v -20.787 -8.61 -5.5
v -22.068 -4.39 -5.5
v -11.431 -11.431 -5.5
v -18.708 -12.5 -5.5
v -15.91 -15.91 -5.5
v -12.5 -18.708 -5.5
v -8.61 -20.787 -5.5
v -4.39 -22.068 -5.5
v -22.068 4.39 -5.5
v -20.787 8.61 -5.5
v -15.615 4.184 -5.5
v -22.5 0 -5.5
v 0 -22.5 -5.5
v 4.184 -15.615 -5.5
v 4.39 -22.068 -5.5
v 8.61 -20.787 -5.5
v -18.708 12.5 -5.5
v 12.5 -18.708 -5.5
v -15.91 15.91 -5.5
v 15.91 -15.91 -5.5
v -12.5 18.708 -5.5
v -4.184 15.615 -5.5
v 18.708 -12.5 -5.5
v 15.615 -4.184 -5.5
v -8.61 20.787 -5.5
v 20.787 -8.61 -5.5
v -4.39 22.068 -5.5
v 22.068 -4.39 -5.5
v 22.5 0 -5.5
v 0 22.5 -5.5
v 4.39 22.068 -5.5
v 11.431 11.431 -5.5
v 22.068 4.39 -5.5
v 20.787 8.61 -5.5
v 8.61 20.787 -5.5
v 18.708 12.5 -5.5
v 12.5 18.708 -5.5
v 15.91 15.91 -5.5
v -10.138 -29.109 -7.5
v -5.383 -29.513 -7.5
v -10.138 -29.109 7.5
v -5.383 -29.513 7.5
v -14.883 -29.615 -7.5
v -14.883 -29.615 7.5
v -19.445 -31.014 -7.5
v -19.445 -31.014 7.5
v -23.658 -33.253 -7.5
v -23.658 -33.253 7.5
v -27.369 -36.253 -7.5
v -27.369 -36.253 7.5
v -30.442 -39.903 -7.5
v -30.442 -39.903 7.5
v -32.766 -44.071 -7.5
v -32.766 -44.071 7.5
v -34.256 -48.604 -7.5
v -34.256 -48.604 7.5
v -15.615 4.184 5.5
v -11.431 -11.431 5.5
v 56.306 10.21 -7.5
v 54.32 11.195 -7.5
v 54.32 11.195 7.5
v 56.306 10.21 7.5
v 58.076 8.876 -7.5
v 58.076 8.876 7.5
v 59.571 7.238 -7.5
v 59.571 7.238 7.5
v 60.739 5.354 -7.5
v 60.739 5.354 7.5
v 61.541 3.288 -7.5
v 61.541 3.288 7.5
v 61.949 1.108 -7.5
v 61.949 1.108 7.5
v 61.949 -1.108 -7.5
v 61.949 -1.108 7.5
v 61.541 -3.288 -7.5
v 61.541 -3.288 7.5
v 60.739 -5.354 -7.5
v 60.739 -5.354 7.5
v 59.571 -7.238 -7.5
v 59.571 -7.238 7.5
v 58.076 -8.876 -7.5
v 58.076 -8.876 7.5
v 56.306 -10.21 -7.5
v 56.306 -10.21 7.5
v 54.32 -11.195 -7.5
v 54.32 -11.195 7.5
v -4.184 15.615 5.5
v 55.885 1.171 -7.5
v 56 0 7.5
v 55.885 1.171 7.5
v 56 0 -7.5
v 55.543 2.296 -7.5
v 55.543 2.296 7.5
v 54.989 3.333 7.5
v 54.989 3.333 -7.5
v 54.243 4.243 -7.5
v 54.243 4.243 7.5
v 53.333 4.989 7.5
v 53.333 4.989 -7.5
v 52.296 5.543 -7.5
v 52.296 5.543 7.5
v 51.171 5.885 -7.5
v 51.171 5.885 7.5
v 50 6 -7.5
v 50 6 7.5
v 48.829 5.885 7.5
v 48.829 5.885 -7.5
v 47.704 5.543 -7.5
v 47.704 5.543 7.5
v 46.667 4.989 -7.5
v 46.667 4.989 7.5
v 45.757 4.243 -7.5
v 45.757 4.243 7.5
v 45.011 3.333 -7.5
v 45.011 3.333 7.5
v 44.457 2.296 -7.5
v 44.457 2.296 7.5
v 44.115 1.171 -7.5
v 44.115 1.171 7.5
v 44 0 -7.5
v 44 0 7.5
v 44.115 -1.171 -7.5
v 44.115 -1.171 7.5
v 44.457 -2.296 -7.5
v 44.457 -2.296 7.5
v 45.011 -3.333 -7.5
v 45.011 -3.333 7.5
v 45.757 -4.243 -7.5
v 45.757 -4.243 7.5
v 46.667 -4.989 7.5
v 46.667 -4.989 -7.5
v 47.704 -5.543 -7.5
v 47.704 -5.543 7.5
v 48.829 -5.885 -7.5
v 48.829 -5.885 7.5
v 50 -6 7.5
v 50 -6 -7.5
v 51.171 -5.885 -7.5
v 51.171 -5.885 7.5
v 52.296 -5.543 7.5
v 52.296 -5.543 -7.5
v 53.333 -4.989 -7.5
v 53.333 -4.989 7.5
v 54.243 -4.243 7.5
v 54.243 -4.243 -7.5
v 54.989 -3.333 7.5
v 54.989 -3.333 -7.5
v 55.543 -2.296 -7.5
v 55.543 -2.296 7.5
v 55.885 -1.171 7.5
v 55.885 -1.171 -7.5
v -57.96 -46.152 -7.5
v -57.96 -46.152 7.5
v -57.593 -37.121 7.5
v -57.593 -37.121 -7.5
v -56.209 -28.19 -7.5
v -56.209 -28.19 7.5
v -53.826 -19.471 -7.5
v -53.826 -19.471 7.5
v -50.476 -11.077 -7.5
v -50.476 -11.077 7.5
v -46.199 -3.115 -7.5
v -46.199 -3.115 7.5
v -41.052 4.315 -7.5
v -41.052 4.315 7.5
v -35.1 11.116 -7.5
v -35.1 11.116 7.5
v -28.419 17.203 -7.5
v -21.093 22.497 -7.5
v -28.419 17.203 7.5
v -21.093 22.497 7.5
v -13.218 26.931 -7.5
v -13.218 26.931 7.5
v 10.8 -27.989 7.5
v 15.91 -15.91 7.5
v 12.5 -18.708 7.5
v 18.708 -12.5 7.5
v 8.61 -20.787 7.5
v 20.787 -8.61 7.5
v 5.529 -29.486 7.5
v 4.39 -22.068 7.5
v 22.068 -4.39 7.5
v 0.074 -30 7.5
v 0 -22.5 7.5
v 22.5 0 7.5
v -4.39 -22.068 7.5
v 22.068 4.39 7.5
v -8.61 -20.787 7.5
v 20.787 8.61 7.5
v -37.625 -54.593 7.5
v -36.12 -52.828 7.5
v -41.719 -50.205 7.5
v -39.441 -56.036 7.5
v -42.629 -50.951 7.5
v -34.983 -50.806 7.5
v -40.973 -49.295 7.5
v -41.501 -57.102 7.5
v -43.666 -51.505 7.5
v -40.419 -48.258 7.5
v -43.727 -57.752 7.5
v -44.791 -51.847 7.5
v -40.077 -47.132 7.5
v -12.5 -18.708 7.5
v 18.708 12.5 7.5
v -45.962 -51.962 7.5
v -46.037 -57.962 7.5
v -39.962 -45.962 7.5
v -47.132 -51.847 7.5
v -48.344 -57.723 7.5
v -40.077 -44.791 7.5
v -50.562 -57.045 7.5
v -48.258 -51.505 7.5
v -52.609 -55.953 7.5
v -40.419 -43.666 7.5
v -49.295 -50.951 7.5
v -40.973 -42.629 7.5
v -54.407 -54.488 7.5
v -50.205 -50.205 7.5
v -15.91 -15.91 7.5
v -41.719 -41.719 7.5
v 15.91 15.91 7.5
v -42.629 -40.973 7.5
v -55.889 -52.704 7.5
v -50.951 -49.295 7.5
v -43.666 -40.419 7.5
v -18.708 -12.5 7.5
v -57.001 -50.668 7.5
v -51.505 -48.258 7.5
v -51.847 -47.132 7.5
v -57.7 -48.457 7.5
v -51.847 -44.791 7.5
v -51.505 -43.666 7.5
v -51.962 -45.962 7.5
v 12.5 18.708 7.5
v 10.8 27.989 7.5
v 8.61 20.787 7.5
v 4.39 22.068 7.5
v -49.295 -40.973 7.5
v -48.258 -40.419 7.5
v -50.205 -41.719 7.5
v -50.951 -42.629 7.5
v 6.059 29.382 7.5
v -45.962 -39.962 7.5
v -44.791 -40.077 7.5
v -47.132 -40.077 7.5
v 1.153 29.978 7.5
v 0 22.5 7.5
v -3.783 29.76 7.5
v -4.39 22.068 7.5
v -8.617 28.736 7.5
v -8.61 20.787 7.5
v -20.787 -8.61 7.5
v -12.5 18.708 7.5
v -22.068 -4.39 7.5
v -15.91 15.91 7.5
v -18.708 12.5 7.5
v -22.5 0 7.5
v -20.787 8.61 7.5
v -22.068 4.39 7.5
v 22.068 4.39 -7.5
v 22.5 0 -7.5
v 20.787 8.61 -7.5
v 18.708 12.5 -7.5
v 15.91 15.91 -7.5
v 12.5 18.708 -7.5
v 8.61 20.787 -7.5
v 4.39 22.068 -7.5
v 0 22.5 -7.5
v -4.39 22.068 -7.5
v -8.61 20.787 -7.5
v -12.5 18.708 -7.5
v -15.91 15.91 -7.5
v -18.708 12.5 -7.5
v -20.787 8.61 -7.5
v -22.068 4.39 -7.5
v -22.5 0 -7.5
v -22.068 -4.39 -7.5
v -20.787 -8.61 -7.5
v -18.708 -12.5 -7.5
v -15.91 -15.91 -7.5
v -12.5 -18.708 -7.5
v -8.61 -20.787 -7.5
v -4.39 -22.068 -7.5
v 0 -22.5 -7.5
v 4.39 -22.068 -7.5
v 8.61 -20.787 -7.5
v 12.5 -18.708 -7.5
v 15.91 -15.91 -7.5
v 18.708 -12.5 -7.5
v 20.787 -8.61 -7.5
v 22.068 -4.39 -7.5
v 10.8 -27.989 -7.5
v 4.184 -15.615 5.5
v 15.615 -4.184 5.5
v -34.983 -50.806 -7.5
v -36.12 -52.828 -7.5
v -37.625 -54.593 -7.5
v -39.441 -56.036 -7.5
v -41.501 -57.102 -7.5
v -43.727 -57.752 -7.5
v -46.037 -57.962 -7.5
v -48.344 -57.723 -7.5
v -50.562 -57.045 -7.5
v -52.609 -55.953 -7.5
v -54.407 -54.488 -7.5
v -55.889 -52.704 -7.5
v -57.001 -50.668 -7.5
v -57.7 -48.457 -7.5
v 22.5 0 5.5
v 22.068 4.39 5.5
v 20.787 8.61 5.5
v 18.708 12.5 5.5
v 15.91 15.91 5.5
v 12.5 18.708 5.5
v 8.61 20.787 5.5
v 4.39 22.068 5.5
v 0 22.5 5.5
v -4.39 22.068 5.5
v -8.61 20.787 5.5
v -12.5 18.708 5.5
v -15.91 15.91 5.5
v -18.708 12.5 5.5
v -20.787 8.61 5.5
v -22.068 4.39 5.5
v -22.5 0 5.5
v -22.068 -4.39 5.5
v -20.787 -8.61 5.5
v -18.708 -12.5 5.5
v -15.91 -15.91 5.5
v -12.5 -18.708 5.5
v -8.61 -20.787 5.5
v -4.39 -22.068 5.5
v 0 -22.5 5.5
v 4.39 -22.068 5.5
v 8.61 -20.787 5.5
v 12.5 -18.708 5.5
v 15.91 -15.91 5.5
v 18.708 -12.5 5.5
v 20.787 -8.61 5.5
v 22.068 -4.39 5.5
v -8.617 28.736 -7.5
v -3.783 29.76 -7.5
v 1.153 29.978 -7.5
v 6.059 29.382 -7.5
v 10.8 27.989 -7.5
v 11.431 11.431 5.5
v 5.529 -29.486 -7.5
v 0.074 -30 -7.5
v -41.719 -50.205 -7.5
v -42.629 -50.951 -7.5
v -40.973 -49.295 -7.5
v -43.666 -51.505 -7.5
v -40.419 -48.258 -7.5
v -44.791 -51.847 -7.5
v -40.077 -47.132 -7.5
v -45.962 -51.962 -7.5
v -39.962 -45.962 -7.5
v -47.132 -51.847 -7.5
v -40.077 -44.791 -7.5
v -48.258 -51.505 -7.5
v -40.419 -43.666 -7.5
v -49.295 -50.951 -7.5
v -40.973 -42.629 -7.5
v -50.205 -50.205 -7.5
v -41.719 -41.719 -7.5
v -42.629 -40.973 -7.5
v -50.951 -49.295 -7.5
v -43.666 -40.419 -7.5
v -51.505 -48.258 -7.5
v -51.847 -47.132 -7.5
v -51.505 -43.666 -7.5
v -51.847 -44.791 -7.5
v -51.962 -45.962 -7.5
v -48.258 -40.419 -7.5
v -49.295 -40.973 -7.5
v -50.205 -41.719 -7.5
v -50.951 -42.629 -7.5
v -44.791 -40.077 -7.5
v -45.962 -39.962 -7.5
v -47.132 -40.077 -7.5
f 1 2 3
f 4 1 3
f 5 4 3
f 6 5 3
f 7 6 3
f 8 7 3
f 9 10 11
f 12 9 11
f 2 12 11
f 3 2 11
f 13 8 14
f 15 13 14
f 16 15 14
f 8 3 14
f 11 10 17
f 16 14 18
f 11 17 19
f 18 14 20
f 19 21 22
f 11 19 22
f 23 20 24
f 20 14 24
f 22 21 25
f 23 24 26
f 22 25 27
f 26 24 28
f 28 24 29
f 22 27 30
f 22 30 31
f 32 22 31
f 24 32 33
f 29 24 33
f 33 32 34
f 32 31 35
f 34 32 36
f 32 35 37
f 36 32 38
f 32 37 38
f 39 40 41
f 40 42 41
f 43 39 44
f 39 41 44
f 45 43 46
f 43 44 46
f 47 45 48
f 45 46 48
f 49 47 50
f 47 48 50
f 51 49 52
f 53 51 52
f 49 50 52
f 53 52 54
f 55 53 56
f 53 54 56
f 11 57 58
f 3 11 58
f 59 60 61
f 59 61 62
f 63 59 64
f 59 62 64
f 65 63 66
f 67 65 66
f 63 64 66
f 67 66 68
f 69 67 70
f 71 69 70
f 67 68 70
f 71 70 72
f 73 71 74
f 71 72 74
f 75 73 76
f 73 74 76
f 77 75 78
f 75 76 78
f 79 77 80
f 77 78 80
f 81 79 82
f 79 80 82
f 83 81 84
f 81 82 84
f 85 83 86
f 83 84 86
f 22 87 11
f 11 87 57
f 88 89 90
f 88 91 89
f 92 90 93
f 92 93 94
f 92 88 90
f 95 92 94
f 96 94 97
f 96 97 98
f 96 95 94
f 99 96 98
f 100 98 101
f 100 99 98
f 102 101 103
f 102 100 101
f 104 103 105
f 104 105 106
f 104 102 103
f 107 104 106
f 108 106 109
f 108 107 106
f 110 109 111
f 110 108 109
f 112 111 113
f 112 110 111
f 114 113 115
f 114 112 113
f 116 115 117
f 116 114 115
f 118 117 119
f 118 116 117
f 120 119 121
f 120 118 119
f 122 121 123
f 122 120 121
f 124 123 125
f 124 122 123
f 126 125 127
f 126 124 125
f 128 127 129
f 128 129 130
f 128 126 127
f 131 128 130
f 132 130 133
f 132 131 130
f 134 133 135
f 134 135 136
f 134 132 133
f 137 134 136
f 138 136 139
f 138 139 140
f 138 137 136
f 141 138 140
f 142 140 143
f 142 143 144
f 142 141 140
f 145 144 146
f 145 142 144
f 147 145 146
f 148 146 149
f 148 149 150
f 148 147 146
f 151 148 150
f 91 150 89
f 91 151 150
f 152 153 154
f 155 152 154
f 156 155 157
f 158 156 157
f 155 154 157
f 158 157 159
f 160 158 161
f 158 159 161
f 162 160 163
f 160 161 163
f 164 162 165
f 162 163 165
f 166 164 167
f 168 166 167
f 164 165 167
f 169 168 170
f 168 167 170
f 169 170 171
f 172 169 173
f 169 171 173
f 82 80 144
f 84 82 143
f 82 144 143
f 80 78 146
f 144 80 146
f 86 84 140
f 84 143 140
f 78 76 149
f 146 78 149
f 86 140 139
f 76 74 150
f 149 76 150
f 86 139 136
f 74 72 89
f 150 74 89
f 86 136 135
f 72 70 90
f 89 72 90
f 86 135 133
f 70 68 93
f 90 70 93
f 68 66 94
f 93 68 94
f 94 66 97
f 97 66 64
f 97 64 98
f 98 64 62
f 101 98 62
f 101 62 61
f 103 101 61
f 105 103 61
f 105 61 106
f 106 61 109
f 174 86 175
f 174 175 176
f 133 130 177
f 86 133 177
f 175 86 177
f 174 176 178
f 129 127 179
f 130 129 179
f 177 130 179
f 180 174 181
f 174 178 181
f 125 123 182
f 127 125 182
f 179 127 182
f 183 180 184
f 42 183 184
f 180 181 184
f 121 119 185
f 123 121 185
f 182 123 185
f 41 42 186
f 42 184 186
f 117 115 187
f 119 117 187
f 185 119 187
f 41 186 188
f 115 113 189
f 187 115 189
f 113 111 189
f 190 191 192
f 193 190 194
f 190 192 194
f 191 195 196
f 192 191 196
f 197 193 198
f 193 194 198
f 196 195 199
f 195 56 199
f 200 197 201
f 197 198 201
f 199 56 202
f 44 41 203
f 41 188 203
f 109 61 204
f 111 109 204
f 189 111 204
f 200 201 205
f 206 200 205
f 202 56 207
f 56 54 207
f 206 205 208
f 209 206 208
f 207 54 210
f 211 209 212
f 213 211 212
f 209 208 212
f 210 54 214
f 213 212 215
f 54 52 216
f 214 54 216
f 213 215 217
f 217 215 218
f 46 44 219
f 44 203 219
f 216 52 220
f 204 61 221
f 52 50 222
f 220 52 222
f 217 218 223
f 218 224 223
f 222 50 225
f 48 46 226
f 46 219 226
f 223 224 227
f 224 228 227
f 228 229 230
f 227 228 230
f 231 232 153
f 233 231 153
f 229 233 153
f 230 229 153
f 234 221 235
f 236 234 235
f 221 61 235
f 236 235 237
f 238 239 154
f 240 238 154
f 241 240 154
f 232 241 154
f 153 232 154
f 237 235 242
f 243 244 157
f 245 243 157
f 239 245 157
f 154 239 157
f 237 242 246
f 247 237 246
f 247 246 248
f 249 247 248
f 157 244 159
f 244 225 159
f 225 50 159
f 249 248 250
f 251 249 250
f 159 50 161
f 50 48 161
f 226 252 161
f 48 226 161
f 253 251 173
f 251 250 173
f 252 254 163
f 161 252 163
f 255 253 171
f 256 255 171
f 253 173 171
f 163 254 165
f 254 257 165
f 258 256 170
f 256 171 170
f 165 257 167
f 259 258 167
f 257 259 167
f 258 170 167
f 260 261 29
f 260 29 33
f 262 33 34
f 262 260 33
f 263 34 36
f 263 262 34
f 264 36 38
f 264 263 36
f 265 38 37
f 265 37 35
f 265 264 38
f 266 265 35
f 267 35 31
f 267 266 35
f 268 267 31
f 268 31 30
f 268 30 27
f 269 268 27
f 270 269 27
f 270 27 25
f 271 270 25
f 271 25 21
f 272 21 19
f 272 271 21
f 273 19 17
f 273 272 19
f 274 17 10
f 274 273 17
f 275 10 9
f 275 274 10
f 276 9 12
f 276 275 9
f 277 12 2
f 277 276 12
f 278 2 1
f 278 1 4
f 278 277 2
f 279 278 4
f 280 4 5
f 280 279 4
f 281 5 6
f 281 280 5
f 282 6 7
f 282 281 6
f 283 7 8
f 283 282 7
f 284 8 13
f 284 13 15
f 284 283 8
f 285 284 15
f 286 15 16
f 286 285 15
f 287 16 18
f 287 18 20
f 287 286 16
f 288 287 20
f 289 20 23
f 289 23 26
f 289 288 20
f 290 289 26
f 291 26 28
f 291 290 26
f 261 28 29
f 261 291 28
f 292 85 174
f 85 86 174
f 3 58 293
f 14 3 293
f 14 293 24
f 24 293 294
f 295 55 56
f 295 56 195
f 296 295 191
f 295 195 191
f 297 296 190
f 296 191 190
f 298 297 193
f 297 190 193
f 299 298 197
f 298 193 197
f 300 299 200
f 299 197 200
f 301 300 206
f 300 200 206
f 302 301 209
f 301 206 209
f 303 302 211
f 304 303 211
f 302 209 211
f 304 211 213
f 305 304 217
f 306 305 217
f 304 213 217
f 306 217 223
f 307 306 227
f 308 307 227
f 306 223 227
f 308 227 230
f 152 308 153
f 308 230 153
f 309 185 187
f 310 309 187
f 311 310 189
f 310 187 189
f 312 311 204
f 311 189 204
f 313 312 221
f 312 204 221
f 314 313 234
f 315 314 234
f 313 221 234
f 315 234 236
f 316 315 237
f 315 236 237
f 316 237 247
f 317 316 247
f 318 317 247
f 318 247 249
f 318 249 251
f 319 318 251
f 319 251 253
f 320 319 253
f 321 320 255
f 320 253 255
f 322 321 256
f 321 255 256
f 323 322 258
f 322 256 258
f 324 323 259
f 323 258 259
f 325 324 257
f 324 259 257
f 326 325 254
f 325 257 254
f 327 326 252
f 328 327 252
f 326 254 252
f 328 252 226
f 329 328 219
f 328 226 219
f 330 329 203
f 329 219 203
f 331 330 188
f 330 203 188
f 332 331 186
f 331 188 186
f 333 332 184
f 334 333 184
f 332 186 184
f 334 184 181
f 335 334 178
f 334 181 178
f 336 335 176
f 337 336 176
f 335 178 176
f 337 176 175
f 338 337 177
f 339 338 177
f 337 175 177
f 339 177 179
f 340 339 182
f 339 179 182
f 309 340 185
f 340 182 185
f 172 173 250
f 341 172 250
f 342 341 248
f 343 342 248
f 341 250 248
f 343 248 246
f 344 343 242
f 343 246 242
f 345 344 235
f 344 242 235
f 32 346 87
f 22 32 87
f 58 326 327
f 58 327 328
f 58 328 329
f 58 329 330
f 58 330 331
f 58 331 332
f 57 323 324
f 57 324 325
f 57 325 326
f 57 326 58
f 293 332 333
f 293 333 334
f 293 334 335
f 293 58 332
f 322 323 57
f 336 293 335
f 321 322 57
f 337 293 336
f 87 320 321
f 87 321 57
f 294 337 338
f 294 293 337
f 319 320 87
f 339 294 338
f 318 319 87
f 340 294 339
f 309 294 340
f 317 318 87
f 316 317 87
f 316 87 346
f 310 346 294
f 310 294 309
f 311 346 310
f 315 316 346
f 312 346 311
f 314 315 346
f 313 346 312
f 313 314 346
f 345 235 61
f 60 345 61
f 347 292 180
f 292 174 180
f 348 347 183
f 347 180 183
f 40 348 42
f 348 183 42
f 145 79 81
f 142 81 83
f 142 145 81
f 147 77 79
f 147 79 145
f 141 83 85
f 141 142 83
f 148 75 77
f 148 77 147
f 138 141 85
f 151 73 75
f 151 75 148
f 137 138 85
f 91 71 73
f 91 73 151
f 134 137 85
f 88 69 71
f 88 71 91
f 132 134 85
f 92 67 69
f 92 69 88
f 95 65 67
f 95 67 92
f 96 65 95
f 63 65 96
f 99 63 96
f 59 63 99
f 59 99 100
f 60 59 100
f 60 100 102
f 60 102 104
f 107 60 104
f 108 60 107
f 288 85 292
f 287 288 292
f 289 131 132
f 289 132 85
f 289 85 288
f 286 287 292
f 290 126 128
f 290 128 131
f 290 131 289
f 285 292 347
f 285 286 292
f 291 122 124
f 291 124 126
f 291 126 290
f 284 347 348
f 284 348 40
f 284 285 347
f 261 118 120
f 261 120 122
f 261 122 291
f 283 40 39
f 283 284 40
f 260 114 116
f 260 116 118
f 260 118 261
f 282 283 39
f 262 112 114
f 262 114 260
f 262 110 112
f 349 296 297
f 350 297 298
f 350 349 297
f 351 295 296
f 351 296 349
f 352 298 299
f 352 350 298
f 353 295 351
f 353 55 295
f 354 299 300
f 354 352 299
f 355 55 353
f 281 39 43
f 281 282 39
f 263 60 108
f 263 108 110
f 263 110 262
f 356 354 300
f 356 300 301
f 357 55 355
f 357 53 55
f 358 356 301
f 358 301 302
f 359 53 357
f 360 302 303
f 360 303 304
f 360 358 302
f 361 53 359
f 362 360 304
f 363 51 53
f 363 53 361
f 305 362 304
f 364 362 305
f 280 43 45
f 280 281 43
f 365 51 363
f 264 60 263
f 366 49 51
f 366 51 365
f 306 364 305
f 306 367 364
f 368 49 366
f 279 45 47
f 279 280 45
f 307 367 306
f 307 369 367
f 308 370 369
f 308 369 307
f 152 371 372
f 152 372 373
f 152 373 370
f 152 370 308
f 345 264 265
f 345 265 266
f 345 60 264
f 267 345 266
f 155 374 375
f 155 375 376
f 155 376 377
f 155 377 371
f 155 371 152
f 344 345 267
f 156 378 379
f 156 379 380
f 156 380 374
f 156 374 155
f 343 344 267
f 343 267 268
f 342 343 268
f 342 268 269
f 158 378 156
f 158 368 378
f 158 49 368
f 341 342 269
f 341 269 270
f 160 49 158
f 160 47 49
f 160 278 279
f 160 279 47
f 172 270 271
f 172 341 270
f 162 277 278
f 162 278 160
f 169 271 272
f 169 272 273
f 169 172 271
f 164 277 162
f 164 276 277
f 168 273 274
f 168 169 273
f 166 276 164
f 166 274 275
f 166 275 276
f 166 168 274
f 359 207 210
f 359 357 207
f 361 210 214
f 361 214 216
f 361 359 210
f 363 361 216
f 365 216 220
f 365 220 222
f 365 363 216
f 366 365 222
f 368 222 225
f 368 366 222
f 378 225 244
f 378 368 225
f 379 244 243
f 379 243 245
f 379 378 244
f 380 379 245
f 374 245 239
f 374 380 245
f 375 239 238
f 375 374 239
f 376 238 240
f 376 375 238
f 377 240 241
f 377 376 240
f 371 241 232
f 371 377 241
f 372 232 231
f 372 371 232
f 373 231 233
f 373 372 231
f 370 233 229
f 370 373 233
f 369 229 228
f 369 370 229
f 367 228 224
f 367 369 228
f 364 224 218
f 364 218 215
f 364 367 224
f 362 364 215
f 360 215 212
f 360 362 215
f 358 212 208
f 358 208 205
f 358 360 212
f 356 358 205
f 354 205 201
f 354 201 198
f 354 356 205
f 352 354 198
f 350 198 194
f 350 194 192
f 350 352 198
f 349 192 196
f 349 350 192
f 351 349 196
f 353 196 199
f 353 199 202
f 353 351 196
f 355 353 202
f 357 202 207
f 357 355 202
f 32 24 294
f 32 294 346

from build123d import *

# Parameters (mm, degrees)
SKETCH_1_R          = 6
EXTRUDE_2_DEPTH     = 7.5
CUT_EXTRUDE_START   = -7.5
SKETCH_4_R          = 22.5
CUT_EXTRUDE_4_DEPTH = 2
CUT_EXTRUDE_START_2 = 7.5
SKETCH_4_2_R        = 22.5
CUT_EXTRUDE_5_DEPTH = 2


with BuildPart() as part:
    # 草圖1 → 填料-伸長2 (new body, symmetric)
    with BuildSketch(Plane.XY):
        with BuildLine():
            Line((10.8, 27.988569095), (54.32, 11.195427638))
            ThreePointArc((54.32, 11.195427638), (62, 0), (54.32, -11.195427638))
            Line((54.32, -11.195427638), (10.8, -27.988569095))
            ThreePointArc((10.8, -27.988569095), (2.81349952, -29.867778968), (-5.383437031, -29.513024341))
            ThreePointArc((-5.383437031, -29.513024341), (-23.658051153, -33.253445018), (-34.256327949, -48.603650133))
            ThreePointArc((-34.256327949, -48.603650133), (-47.196522871, -57.898263789), (-57.960436879, -46.151917853))
            ThreePointArc((-57.960436879, -46.151917853), (-46.199430838, -3.114505899), (-13.217722281, 26.931242409))
            ThreePointArc((-13.217722281, 26.931242409), (-1.31940524, 29.97097212), (10.8, 27.988569095))
        make_face()
        with Locations((50, 0)):
            Circle(SKETCH_1_R, mode=Mode.SUBTRACT)
        with Locations((-45.961940777, -45.961940777)):
            Circle(SKETCH_1_R, mode=Mode.SUBTRACT)
        Polygon((15.614971003, -4.18401887), (11.430952133, 11.430952133), (-4.18401887, 15.614971003), (-15.614971003, 4.18401887), (-11.430952133, -11.430952133), (4.18401887, -15.614971003), align=None, mode=Mode.SUBTRACT)
    extrude(amount=EXTRUDE_2_DEPTH, both=True)

    # 草圖4 → 除料-伸長4 (cut)
    with BuildSketch(Plane.XY.offset(CUT_EXTRUDE_START)):
        Circle(SKETCH_4_R)
    extrude(amount=CUT_EXTRUDE_4_DEPTH, mode=Mode.SUBTRACT)

    # 草圖4<2> → 除料-伸長5 (cut)
    with BuildSketch(Plane.XY.offset(CUT_EXTRUDE_START_2)):
        Circle(SKETCH_4_2_R)
    extrude(amount=-CUT_EXTRUDE_5_DEPTH, mode=Mode.SUBTRACT)


solid = part.part
